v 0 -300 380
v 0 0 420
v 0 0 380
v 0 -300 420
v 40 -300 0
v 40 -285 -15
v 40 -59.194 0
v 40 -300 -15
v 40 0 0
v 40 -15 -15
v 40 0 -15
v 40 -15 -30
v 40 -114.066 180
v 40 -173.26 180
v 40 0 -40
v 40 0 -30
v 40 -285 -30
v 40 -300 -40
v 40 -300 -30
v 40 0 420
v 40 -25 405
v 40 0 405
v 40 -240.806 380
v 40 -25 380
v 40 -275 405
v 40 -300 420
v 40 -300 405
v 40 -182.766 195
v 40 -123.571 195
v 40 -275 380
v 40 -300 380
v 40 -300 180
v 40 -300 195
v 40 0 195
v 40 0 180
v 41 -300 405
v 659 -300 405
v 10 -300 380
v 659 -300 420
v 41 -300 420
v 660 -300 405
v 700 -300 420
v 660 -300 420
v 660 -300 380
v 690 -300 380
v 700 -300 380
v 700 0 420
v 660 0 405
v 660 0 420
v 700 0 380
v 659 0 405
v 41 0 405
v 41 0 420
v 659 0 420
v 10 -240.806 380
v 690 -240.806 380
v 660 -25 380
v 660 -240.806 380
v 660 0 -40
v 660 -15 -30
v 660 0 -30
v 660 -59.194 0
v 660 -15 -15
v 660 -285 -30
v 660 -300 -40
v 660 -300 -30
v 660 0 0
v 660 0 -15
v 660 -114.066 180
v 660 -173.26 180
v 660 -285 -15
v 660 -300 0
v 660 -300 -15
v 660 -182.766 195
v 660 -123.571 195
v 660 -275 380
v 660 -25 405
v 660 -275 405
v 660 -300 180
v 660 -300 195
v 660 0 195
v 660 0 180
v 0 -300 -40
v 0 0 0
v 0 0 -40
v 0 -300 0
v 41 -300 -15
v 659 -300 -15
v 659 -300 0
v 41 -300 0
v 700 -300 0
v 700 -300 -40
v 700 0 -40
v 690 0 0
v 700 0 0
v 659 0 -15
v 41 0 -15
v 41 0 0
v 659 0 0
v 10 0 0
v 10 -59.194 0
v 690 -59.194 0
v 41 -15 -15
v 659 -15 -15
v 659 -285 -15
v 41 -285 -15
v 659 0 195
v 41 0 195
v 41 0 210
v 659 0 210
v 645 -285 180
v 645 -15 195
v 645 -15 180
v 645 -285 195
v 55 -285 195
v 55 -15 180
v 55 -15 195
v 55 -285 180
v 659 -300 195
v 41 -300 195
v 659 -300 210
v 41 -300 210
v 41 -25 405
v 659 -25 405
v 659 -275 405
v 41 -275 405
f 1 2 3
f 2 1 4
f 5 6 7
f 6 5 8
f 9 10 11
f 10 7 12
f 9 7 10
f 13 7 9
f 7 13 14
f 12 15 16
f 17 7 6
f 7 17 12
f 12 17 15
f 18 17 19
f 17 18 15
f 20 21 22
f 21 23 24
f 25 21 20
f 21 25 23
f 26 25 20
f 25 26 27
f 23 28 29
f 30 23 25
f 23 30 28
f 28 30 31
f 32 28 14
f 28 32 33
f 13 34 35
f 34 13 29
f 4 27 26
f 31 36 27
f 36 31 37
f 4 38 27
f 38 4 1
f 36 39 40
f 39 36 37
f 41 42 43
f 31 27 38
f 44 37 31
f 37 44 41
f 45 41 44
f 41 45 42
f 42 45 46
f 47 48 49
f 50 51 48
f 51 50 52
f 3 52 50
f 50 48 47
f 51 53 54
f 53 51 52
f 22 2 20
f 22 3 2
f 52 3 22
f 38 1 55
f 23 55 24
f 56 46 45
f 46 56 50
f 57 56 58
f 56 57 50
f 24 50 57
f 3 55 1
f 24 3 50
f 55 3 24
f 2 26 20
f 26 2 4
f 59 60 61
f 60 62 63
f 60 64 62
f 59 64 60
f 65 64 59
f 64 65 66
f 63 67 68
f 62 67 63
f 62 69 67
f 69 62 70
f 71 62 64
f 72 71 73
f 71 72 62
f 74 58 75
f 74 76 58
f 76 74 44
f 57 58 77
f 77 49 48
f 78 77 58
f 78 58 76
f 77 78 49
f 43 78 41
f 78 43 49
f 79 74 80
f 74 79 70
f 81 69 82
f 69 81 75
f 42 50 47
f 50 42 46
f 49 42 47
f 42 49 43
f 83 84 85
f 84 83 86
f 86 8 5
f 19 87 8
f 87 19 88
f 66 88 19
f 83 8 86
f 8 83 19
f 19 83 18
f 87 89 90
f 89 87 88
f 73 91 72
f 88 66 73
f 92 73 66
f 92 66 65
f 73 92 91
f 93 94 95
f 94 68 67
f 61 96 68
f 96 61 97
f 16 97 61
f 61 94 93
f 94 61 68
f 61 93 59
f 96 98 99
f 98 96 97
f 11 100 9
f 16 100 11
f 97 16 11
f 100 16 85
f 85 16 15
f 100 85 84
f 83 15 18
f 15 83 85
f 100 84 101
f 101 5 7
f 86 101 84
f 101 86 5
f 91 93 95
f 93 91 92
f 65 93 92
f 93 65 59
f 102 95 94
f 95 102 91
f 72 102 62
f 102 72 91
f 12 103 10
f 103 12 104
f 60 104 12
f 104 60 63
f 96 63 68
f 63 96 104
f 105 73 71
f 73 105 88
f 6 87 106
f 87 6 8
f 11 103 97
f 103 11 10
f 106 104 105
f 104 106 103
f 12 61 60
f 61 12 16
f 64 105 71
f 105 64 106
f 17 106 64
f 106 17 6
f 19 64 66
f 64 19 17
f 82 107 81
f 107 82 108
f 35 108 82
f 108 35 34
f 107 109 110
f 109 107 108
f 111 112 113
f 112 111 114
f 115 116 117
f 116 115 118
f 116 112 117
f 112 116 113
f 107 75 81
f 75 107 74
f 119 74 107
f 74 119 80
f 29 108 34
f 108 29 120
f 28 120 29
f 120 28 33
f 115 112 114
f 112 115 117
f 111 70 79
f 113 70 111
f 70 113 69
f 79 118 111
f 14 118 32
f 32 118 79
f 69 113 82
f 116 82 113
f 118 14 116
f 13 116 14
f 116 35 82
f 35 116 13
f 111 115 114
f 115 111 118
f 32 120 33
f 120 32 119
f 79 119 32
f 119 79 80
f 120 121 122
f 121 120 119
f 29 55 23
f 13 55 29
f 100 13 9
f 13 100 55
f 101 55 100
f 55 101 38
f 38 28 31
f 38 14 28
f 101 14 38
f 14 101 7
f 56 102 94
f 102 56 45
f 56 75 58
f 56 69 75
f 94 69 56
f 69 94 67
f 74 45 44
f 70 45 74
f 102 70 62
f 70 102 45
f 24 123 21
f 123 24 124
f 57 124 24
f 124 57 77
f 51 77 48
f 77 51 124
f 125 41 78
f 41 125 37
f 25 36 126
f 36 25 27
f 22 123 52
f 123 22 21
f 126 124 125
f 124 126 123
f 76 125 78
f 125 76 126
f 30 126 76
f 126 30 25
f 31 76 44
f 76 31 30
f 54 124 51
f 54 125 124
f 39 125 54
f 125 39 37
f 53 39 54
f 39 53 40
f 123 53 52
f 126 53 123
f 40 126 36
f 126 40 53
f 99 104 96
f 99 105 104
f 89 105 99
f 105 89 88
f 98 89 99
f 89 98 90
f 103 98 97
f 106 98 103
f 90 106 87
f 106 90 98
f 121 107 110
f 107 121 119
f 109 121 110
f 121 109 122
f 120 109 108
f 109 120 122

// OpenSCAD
module metalon( perf, l, angle1 = 0, angle2 = 0 ) {
    
    cube( [ perf[ 0 ], perf[ 1 ], l ] );
    
}

horizontais = true;

l = 700;
w = 300;
h = 460;

h_lat = 40;
w_lat = 40;

h_diag = 50;
w_diag = 30;

h_travessa = 25;
w_travessa = 25;

h_travessinha = 15;
w_travessinha = 15;

w_tampo = 15;

L = sqrt( w * w + pow( h - 2 * h_lat, 2 ) );
L_tilde = sqrt( L * L - h_diag * h_diag );
angle_diag = atan( w / ( h - 2 * h_lat ) ) - atan( h_diag / L_tilde );

echo( "Comprimento do metal diagonal: ", L_tilde );
echo( "Ângulo do metal diagonal: ", angle_diag );

cor_metal = [ 0.3, 0.3, 0.3 ];
cor_tampo = [ 1.0, 1.0, 1.0 ];

color( cor_metal ) { 
    
    // Laterais horizontais:
    translate( [ 0, 0, -h_lat ] ){
        rotate( 90, [ 1, 0, 0 ] )
            metalon( [ w_lat, h_lat ], w );
        translate( [ l - w_lat, 0, 0 ] )
            rotate( 90, [ 1, 0, 0 ] )
                metalon( [ w_lat, h_lat ], w );
        
        translate( [ 0, 0, h - h_lat ] ){
            rotate( 90, [ 1, 0, 0 ] )
                metalon( [ w_lat, h_lat ], w );
            translate( [ l - w_lat, 0, 0 ] )
                rotate( 90, [ 1, 0, 0 ] )
                    metalon( [ w_lat, h_lat ], w );
        }
    }

    // Laterais diagonais:
    rotate( angle_diag, [ 1, 0, 0 ] )
        translate( [ w_lat - w_diag, -h_diag, 0 ] )
            metalon( [ w_diag, h_diag ], L_tilde );
    translate( [ l - w_lat, 0, 0 ] )
    rotate( angle_diag, [ 1, 0, 0 ] )
        translate( [ 0, -h_diag, 0 ] )
            metalon( [ w_diag, h_diag ], L_tilde );
            echo( L_tilde );

    // Travessas do assento:
    translate( [ w_lat, -w_travessa, h - h_lat - h_travessa - w_tampo ] )
        rotate( 90, [ 0, 0, 1 ] ) rotate( 90, [ 1, 0, 0 ] )
            metalon( [ w_travessa, h_travessa ], l - 2 * w_lat );
    echo( l - 2 * w_lat );
    translate( [ 0, -w + w_travessa, 0 ] )
        translate( [ w_lat, -w_travessa, h - h_lat - h_travessa - w_tampo ] )
            rotate( 90, [ 0, 0, 1 ] ) rotate( 90, [ 1, 0, 0 ] )
                metalon( [ w_travessa, h_travessa ], l - 2 * w_lat );

    // Travessas inferiores:
    if ( horizontais ) {
        translate( [ w_lat, -w_travessinha, -h_travessinha - w_tampo  ] )
            rotate( 90, [ 0, 0, 1 ] ) rotate( 90, [ 1, 0, 0 ] )
                metalon( [ w_travessinha, h_travessinha ], l - 2 * w_lat );
        translate( [ 0, w_travessinha - w, 0 ] )
            translate( [ w_lat, -w_travessinha, -h_travessinha - w_tampo  ] )
                rotate( 90, [ 0, 0, 1 ] ) rotate( 90, [ 1, 0, 0 ] )
                    metalon( [ w_travessinha, h_travessinha ], l - 2 * w_lat );
    }
    else {
        translate( [ w_lat, 0, -h_travessinha - w_tampo  ] )
            rotate( 0, [ 0, 0, 1 ] ) rotate( 90, [ 1, 0, 0 ] )
                metalon( [ w_travessinha, h_travessinha ], w );
        translate( [ l - w_travessinha - w_lat, 0, -h_travessinha - w_tampo  ] )
            rotate( 0, [ 0, 0, 1 ] ) rotate( 90, [ 1, 0, 0 ] )
                metalon( [ w_travessinha, h_travessinha ], w );
    }

    // Travessas centrais:
    
    if ( horizontais ) {
        translate( [ w_lat + w_travessinha, -w_travessinha, -h_travessinha - w_tampo + ( h - h_lat ) / 2  ] )
            rotate( 90, [ 0, 0, 1 ] ) rotate( 90, [ 1, 0, 0 ] )
                metalon( [ w_travessinha, h_travessinha ], l - 2 * w_lat - 2 * w_travessinha );
        translate( [ 0, w_travessinha - w, 0 ] )
            translate( [ w_lat + w_travessinha, -w_travessinha, -h_travessinha - w_tampo + ( h - h_lat ) / 2  ] )
                rotate( 90, [ 0, 0, 1 ] ) rotate( 90, [ 1, 0, 0 ] )
                    metalon( [ w_travessinha, h_travessinha ], l - 2 * w_lat - 2 * w_travessinha );
    }

    translate( [ w_lat, 0, -h_travessinha - w_tampo + ( h - h_lat ) / 2  ] )
        rotate( 0, [ 0, 0, 1 ] ) rotate( 90, [ 1, 0, 0 ] )
            metalon( [ w_travessinha, h_travessinha ], w );
    translate( [ l - w_travessinha - w_lat, 0, -h_travessinha - w_tampo + ( h - h_lat ) / 2  ] )
        rotate( 0, [ 0, 0, 1 ] ) rotate( 90, [ 1, 0, 0 ] )
            metalon( [ w_travessinha, h_travessinha ], w );
}

translate( [ w_lat + 1, -w, h - w_tampo - h_lat ] )
    color( cor_tampo )
        cube( [ l - 2 * w_lat - 2, w, w_tampo ] );
translate( [ w_lat + 1, -w, -w_tampo ] )
    color( cor_tampo )
        cube( [ l - 2 * w_lat - 2, w, w_tampo ] );
translate( [ w_lat + 1, -w, -w_tampo + ( h - h_lat ) / 2 ] )
    color( cor_tampo )
        cube( [ l - 2 * w_lat - 2, w, w_tampo ] );

echo( "Dimensões do tampo: ", l - 2 * w_lat - 2, ", ", w );
//
//echo( "Comprimento metalon diagonal: ", L_tilde );
//echo( "Ângulo metalon diagonal: ", angle_diag );
